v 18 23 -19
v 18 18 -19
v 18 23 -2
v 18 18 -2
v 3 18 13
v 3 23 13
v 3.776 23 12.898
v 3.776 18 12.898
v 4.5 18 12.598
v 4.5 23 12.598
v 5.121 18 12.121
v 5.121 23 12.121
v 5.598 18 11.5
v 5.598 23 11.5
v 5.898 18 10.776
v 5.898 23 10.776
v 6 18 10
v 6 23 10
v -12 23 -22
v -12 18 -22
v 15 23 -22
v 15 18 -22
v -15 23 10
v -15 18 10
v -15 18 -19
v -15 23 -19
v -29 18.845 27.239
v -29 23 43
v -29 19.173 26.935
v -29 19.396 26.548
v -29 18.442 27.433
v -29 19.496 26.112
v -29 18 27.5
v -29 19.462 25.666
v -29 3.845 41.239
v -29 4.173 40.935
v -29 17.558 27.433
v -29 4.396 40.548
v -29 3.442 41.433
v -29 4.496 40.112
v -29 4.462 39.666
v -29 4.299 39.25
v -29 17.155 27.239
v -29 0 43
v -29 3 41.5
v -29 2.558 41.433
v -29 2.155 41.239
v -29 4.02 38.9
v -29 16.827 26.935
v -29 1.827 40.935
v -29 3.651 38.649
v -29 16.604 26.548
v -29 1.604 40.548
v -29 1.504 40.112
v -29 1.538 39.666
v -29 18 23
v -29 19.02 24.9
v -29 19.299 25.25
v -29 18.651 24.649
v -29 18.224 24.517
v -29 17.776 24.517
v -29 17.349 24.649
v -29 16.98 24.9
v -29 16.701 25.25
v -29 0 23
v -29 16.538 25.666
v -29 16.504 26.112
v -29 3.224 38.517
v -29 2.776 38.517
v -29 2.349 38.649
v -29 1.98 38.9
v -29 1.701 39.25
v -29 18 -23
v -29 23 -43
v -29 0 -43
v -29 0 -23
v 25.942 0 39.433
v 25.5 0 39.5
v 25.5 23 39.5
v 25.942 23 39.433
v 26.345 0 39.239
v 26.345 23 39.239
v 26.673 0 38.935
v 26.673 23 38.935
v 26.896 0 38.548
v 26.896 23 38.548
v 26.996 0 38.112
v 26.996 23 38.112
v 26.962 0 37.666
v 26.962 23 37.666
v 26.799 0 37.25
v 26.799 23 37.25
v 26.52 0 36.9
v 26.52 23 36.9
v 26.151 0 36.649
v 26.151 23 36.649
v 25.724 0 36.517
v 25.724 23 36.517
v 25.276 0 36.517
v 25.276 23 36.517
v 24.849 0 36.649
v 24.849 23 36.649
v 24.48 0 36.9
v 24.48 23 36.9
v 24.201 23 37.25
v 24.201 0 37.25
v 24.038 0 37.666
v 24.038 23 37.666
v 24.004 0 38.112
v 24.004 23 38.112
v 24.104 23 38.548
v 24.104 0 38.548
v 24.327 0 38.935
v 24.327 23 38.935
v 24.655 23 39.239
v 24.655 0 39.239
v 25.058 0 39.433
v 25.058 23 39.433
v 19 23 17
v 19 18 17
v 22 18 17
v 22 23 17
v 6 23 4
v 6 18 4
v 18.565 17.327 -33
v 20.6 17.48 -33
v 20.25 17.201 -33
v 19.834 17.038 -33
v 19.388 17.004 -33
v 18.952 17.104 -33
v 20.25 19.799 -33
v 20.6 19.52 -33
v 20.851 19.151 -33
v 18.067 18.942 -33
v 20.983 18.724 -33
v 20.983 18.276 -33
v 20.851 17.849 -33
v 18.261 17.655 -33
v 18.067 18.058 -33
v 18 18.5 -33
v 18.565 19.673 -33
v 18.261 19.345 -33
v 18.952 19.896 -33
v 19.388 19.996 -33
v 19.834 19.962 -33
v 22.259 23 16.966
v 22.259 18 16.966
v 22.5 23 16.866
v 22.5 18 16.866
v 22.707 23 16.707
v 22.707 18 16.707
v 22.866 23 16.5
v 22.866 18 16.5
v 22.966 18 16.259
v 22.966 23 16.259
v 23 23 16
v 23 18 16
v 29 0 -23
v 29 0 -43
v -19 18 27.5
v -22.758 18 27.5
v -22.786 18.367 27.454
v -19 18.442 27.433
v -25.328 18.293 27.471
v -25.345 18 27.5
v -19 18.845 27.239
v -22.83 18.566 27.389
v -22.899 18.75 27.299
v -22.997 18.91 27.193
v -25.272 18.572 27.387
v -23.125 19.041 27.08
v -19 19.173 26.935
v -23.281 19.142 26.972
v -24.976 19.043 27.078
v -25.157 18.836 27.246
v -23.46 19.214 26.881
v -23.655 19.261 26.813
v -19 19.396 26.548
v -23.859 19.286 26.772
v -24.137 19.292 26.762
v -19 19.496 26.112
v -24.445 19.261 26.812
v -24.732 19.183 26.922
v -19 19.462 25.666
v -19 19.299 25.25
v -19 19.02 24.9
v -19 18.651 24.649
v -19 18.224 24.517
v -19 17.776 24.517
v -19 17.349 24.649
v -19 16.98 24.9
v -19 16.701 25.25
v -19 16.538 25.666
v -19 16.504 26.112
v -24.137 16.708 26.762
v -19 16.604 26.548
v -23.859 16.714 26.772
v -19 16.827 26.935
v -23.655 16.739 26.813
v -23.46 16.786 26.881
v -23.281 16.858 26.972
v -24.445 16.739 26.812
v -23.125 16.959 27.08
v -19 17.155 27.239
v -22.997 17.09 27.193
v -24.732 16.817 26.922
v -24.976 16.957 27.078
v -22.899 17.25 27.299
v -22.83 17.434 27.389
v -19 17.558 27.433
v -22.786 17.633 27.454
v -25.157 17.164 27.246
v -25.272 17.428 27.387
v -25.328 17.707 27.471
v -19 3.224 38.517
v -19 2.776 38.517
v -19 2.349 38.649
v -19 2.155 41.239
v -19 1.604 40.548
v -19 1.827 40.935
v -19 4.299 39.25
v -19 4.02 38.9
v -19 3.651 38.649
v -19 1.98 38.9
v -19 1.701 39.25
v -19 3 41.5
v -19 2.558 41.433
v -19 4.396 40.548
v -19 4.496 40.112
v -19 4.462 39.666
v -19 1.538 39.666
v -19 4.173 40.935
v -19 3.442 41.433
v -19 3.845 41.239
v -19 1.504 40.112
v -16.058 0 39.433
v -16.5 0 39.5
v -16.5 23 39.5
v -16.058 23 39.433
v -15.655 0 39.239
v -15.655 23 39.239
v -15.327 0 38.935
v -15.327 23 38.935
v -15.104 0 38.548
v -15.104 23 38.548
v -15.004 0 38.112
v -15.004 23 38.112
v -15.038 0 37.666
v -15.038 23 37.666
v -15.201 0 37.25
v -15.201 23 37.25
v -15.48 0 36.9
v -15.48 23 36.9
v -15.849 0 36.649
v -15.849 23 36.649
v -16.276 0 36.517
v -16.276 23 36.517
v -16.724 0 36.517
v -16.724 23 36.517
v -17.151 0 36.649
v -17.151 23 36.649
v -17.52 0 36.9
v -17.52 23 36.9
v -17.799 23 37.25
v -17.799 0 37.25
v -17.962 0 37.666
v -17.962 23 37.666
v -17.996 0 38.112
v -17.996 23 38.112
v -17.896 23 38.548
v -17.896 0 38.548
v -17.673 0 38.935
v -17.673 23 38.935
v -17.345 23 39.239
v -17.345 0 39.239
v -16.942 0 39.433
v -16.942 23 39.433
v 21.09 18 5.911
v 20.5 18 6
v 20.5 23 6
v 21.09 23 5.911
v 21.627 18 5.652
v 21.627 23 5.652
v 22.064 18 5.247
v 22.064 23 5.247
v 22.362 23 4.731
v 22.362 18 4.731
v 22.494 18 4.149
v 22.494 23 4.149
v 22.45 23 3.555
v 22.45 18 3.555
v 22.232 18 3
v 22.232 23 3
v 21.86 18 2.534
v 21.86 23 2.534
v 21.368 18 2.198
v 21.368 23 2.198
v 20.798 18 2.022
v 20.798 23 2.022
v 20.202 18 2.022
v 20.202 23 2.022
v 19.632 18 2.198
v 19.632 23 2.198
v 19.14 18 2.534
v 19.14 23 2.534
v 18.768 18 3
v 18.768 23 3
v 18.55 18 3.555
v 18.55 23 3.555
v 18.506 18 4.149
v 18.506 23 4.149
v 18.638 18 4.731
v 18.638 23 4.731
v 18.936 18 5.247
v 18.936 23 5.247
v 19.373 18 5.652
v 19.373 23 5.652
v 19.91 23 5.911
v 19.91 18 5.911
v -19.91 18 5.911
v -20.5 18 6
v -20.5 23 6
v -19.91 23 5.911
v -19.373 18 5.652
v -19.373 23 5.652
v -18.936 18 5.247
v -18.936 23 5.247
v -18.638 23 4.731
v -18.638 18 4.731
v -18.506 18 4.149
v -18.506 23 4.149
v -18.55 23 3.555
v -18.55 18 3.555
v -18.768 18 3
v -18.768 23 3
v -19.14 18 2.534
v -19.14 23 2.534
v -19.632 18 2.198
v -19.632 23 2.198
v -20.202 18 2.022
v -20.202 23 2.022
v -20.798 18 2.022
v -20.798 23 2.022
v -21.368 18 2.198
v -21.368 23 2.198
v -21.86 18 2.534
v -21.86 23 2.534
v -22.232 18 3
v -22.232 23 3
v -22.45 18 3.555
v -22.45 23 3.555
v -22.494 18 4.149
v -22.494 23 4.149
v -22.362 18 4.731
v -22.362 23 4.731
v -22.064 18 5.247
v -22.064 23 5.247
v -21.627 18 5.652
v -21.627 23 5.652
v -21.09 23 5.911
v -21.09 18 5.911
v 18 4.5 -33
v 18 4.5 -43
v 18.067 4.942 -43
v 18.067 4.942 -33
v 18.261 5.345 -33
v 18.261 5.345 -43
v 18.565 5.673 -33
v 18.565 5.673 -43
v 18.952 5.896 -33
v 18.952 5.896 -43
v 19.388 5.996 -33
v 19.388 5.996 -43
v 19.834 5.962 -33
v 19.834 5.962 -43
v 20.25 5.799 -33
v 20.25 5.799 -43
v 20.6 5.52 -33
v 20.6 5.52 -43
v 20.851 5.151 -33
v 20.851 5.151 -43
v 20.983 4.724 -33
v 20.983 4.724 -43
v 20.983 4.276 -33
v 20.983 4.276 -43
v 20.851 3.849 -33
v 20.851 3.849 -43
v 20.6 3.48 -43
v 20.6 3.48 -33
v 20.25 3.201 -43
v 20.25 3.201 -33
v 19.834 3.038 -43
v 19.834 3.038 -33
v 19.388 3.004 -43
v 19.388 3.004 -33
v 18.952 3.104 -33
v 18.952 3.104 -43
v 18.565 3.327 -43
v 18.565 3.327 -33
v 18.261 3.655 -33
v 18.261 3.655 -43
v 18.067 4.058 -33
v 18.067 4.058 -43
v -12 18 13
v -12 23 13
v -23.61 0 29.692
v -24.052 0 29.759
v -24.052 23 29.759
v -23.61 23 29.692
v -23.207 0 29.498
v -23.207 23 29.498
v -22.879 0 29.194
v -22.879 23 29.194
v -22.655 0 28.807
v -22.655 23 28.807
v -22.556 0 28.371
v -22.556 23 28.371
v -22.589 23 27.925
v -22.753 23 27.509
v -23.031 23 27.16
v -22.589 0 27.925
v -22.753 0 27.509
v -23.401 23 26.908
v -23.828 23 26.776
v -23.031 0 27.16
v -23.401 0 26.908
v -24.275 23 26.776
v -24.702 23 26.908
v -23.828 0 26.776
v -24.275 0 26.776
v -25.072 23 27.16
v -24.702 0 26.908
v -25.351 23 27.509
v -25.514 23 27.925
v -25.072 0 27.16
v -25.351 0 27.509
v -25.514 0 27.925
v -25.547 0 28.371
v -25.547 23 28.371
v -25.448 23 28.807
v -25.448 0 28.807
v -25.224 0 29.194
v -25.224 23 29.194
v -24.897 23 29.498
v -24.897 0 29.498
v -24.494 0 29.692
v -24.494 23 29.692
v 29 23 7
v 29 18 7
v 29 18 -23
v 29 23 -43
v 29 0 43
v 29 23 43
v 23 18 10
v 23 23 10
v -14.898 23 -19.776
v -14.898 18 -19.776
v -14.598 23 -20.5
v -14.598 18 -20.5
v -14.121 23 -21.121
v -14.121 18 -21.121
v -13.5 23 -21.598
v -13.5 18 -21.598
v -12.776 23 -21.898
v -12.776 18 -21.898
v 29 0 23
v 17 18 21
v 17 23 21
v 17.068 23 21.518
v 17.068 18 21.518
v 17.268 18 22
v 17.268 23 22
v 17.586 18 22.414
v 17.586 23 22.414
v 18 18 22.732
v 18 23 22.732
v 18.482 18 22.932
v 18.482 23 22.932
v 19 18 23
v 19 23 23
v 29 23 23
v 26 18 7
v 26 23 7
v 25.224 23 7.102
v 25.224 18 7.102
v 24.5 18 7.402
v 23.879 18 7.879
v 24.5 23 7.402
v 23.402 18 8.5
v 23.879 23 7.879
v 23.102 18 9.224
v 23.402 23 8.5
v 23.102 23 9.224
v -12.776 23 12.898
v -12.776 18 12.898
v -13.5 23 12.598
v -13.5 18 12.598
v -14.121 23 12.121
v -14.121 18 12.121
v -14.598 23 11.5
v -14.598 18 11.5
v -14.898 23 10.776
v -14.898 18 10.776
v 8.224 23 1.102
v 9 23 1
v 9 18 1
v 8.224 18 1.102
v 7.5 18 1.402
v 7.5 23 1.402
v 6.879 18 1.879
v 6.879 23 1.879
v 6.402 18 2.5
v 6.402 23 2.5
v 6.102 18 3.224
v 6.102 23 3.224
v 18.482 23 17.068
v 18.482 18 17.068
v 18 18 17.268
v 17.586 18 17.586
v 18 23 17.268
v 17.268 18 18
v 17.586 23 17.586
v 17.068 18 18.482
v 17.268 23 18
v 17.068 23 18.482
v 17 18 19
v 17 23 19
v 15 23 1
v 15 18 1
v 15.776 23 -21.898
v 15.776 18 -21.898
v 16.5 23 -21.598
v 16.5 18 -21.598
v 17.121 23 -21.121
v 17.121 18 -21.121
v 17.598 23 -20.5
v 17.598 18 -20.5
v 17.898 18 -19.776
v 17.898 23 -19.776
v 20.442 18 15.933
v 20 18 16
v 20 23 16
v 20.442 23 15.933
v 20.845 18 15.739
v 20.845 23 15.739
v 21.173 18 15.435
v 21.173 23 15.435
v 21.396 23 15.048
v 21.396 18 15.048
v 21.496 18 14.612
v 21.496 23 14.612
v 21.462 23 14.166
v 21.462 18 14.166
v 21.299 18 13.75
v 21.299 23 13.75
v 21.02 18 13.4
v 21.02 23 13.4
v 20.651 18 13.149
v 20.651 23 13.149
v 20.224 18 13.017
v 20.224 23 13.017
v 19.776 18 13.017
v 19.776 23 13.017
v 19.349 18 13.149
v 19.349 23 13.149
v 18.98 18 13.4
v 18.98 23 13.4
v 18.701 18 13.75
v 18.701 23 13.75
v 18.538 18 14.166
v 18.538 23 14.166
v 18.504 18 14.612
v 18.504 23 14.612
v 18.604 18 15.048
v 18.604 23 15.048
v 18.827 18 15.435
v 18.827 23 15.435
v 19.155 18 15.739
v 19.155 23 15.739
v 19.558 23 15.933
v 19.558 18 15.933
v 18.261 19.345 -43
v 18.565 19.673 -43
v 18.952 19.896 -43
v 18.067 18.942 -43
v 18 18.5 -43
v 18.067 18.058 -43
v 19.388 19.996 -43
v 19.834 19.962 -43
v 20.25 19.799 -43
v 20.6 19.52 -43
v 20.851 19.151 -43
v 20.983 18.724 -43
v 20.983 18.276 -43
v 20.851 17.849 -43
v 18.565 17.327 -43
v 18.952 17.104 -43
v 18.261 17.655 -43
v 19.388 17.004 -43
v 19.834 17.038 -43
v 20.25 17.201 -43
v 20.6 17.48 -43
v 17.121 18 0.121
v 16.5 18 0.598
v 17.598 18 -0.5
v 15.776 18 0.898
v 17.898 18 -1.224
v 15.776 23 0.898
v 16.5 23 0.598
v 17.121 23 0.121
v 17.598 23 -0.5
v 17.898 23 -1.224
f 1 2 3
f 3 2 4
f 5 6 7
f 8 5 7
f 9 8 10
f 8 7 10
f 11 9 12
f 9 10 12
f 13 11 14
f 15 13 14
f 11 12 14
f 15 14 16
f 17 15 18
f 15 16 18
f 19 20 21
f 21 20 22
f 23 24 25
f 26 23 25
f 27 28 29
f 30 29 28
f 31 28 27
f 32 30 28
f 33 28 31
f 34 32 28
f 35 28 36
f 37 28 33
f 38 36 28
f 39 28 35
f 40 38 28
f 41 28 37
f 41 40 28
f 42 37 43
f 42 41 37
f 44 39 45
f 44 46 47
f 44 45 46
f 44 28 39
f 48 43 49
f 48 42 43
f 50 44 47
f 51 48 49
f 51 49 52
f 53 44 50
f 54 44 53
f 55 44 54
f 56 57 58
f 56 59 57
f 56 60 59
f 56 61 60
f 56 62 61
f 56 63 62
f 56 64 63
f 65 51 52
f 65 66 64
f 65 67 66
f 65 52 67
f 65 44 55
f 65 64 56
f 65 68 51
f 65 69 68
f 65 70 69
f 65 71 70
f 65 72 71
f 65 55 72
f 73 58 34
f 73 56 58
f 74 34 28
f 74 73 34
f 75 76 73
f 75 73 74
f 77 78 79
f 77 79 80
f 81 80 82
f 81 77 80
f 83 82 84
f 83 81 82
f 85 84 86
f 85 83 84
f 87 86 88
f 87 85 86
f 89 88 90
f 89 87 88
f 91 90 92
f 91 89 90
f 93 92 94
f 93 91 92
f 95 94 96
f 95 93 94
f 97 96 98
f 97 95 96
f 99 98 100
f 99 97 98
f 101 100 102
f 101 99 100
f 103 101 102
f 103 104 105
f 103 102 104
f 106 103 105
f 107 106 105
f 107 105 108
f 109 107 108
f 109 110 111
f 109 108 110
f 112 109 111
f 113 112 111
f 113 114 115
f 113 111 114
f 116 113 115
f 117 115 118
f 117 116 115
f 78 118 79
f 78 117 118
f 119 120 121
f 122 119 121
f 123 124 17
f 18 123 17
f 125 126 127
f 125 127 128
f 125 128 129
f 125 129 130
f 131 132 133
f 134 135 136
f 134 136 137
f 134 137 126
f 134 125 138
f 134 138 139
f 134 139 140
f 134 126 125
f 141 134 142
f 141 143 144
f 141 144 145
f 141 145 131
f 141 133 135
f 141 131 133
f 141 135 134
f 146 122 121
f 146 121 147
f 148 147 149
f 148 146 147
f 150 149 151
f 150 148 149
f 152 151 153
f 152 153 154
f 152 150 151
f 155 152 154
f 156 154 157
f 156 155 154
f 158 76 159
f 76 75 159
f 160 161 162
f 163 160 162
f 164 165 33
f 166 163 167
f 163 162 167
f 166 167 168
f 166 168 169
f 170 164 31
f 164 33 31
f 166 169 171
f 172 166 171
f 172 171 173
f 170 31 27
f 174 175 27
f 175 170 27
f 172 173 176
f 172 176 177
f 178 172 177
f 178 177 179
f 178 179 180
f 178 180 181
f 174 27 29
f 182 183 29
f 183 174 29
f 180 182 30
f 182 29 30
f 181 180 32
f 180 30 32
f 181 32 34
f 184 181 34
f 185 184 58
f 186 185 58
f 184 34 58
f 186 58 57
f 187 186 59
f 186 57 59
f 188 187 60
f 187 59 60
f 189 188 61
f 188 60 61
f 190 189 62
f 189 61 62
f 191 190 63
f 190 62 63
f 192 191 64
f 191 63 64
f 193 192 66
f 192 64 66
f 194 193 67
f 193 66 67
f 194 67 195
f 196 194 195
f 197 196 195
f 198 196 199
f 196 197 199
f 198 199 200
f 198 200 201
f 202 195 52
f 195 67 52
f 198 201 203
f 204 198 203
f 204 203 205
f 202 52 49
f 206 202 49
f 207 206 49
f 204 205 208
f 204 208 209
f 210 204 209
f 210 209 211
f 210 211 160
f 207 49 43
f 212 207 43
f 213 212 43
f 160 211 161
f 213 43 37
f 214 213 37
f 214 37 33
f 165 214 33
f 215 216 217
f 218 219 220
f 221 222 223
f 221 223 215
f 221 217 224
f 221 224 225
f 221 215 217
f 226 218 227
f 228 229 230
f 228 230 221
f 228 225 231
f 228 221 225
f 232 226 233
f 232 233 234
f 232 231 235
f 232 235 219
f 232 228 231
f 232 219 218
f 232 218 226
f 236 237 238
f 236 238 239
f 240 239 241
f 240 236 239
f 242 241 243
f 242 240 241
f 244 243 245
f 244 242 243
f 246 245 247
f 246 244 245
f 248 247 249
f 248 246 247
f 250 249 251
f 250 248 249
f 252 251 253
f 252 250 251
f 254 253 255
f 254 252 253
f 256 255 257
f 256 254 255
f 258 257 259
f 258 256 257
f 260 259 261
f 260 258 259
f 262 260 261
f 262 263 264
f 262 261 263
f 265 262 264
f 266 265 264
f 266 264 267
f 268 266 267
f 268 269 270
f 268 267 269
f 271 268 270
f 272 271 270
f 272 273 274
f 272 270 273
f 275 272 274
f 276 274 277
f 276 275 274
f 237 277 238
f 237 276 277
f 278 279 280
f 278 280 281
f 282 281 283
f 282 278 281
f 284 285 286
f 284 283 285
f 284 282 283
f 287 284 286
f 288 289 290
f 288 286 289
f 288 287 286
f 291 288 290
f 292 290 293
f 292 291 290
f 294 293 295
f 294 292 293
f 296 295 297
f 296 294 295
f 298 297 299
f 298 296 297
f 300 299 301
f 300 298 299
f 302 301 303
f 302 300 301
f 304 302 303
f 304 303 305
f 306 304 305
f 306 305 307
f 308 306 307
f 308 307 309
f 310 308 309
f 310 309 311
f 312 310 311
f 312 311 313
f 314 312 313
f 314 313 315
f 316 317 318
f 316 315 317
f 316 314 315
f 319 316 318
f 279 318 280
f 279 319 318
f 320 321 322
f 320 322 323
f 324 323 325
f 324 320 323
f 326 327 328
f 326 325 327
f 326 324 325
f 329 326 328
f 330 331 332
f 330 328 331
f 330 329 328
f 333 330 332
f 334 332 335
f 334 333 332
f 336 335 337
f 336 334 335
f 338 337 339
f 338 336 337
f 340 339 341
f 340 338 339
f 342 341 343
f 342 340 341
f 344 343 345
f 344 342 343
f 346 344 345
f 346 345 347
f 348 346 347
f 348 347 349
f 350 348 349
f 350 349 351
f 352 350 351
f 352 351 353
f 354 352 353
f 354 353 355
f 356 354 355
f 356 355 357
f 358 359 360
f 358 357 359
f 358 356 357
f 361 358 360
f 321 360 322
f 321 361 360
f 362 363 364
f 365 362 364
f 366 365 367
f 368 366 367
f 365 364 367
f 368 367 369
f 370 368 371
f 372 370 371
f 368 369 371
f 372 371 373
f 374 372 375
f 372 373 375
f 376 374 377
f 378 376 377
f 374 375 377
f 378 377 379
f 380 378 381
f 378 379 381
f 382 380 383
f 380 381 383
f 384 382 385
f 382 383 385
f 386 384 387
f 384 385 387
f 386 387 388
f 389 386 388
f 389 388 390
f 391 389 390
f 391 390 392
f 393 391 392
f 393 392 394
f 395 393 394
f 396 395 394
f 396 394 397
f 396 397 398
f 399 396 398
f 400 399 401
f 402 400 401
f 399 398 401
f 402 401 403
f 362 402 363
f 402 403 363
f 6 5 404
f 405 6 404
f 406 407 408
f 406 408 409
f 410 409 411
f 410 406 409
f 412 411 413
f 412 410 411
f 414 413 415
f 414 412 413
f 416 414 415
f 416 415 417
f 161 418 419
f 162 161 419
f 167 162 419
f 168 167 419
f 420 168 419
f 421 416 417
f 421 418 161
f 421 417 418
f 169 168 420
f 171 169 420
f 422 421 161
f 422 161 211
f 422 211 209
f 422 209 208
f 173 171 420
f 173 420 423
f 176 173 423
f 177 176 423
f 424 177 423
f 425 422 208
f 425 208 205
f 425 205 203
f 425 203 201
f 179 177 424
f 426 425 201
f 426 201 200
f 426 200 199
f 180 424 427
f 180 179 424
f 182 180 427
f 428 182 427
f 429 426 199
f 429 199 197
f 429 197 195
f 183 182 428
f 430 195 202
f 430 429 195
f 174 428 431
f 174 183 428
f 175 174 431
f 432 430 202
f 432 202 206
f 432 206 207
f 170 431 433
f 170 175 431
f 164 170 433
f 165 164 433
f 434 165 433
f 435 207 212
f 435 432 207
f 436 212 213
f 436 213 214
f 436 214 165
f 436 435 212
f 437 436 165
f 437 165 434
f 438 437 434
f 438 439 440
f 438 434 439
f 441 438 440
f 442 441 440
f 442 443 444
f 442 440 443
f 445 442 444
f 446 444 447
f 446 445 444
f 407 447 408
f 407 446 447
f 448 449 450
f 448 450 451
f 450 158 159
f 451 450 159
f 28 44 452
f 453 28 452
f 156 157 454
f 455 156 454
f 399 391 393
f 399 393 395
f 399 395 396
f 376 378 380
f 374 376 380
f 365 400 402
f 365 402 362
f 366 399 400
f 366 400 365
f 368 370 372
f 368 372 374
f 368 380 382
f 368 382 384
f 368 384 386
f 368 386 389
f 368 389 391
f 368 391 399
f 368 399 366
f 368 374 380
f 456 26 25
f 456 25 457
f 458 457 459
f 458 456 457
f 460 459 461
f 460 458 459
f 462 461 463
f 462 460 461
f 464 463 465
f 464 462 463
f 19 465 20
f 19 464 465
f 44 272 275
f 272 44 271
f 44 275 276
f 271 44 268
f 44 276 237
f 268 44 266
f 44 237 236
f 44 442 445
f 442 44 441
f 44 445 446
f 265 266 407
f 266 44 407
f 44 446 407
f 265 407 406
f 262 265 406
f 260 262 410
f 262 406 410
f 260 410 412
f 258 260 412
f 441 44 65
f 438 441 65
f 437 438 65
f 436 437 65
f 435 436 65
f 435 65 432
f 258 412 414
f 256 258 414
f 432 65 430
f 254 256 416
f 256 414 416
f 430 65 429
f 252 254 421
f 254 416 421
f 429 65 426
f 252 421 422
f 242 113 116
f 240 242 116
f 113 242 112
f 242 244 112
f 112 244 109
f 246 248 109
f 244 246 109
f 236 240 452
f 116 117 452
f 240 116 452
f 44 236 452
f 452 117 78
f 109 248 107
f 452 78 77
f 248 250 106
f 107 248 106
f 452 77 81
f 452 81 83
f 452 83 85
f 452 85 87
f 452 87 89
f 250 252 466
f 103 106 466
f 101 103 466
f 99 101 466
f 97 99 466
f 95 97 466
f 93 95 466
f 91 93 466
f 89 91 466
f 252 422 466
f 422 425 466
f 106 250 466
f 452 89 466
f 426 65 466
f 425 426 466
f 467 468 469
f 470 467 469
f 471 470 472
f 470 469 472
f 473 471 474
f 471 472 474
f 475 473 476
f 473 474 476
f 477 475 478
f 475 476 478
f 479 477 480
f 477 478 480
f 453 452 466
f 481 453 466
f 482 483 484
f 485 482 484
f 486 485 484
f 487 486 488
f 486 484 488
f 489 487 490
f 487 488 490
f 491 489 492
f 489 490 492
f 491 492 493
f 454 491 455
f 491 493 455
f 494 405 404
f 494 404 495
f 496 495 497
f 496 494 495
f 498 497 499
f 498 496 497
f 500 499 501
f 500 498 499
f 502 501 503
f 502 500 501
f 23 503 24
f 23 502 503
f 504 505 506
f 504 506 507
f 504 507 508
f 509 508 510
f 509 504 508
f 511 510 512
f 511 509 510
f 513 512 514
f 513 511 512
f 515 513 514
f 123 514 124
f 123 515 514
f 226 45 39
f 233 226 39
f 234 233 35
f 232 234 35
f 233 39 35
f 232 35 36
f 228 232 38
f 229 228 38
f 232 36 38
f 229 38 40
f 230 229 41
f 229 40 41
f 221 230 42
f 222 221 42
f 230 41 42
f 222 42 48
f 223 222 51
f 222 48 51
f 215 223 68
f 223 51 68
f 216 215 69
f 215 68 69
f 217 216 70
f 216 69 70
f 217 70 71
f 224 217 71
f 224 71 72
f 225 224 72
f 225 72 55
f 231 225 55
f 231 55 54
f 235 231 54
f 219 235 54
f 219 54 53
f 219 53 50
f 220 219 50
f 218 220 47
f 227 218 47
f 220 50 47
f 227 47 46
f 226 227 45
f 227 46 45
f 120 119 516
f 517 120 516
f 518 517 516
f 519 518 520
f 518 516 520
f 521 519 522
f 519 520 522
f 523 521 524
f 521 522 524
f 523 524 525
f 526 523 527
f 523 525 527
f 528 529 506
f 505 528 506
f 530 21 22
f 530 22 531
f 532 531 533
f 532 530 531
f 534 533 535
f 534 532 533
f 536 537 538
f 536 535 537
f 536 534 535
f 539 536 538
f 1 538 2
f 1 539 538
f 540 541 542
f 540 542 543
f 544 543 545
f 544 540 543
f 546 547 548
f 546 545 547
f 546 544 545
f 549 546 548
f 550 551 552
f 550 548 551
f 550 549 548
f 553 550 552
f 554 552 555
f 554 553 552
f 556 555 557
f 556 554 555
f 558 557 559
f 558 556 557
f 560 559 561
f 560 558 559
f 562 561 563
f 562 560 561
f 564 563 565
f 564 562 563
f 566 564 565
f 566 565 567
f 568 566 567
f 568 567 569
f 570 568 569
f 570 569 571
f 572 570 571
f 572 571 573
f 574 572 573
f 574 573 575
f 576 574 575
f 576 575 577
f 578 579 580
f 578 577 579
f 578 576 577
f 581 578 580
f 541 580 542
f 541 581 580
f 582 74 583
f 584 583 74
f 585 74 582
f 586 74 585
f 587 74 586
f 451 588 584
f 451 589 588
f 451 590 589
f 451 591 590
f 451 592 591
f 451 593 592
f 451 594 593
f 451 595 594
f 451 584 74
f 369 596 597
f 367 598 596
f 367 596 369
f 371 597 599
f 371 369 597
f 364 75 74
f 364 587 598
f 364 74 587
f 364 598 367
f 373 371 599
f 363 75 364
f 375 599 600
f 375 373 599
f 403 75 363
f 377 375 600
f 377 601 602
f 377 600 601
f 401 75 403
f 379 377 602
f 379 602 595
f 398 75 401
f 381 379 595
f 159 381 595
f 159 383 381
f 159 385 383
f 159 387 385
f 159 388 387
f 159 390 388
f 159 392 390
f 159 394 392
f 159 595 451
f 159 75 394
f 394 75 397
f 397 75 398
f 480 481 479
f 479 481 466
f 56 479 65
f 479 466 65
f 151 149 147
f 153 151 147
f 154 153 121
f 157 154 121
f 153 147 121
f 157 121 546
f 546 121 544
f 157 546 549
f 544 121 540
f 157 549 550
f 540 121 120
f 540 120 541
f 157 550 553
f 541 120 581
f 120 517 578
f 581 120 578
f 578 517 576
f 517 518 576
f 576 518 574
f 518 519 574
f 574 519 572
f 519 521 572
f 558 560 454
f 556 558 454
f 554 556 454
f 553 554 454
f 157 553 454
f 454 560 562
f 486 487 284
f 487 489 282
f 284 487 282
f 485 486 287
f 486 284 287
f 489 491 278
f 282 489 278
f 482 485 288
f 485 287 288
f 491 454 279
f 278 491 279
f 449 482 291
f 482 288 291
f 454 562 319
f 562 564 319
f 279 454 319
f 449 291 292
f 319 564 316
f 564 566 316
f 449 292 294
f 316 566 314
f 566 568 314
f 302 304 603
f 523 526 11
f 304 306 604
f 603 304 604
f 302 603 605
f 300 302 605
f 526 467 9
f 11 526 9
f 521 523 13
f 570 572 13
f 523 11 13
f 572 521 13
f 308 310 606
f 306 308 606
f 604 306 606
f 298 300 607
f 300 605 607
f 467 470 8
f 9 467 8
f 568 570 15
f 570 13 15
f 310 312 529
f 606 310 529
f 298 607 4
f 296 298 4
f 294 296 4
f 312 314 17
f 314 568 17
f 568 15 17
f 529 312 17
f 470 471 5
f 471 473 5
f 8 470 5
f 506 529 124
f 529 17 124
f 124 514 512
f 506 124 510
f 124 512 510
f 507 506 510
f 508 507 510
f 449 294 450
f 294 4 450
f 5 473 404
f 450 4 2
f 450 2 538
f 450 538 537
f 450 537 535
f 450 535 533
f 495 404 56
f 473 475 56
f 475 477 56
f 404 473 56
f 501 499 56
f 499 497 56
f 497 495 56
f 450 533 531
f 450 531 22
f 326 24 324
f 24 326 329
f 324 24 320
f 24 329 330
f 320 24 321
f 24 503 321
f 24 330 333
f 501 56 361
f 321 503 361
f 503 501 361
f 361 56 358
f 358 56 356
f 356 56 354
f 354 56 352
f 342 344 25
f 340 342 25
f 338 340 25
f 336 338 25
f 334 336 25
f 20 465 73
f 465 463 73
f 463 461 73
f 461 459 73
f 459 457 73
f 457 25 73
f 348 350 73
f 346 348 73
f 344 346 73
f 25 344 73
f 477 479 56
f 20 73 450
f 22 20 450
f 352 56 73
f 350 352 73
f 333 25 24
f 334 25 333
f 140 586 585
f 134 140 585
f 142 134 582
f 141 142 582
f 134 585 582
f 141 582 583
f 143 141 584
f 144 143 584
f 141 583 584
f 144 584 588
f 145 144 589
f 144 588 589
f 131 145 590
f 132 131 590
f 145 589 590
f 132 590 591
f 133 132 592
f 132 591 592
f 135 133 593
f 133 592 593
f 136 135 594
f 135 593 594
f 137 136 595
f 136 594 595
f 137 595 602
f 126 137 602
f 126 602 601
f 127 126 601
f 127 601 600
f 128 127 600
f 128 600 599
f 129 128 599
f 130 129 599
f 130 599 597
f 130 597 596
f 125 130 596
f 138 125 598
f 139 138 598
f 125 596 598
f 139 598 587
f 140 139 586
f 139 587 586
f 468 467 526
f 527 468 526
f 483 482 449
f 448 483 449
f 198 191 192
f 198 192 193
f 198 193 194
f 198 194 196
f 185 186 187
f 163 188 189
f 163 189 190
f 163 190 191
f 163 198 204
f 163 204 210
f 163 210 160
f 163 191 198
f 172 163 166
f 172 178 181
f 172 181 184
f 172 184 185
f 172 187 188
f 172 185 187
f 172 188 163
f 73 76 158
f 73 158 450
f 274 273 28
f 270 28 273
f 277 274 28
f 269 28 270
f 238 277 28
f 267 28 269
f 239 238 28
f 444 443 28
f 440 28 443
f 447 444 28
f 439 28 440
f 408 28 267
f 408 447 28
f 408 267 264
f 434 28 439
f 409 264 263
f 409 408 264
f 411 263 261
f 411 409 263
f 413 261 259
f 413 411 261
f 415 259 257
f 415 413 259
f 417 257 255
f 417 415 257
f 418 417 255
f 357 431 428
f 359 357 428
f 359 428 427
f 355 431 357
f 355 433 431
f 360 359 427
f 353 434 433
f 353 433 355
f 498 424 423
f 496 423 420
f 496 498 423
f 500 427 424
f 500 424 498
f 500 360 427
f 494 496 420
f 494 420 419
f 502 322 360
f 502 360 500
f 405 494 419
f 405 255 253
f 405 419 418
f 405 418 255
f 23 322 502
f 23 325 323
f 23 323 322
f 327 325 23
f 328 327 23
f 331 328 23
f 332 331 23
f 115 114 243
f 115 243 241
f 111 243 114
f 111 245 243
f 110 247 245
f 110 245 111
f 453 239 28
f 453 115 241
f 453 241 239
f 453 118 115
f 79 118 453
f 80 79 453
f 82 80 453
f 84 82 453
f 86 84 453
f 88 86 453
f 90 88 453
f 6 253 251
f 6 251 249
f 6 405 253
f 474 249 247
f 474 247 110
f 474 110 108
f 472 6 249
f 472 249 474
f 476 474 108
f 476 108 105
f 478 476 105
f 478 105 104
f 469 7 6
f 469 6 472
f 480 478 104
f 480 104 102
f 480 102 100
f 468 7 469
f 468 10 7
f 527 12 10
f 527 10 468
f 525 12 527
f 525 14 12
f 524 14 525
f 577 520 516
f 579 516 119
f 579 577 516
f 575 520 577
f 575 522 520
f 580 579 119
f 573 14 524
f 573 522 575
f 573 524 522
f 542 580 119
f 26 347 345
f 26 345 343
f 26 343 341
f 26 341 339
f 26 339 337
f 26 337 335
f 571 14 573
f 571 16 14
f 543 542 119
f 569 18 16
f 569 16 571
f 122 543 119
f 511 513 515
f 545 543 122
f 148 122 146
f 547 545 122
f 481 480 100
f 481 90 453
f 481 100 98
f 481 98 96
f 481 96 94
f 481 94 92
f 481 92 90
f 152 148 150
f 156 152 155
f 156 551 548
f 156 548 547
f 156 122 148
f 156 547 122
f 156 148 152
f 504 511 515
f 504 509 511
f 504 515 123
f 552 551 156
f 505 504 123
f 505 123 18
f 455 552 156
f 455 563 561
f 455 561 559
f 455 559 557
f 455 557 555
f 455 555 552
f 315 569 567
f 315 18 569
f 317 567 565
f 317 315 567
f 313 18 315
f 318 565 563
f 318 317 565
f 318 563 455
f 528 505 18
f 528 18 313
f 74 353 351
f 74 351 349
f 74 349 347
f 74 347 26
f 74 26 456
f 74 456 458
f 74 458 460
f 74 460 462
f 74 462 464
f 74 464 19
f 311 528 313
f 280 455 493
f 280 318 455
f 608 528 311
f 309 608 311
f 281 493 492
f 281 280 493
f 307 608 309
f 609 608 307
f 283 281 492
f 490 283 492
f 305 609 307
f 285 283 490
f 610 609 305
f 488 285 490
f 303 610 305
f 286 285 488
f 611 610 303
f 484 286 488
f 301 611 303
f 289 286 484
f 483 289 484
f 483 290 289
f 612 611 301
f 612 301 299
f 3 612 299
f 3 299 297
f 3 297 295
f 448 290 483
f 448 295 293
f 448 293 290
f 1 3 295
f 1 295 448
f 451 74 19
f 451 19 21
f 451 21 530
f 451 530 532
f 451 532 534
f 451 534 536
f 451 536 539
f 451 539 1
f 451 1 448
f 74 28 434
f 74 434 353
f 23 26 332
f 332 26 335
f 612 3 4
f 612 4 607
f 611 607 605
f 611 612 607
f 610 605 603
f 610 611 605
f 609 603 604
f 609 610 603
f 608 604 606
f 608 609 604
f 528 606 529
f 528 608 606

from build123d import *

# Parameters (mm, degrees)
SKETCH1_W               = 58
SKETCH1_H               = 86
BOSS_EXTRUDE1_DEPTH     = 23
CUT_EXTRUDE1_DEPTH      = 23
CUT_EXTRUDE2_DEPTH      = 23
FILLET1_R               = 3
FILLET2_R               = 2
FILLET3_R               = 2
FILLET4_R               = 1
FILLET5_R               = 3
FILLET6_R               = 3
FILLET7_R               = 3
FILLET8_R               = 3
FILLET9_R               = 3
FILLET10_R              = 3
CUT_EXTRUDE3_DEPTH      = 57.73623181
CUT_EXTRUDE3_DEPTH_BACK = 57.73623181
SKETCH4_W               = 46
SKETCH4_H               = 18
CUT_EXTRUDE4_DEPTH      = 57.73623181
CUT_EXTRUDE4_DEPTH_BACK = 57.73623181
SKETCH5_R               = 2
SKETCH5_R_2             = 1.5
SKETCH6_R               = 1.5
CUT_EXTRUDE11_DEPTH     = 10
SKETCH7_R               = 1.5
CUT_EXTRUDE12_DEPTH     = 10


with BuildPart() as part:
    # Sketch1 → Boss-Extrude1 (new body)
    with BuildSketch(Plane(origin=(0, 0, 0), x_dir=(1, 0, 0), z_dir=(0, 1, 0))):
        Rectangle(SKETCH1_W, SKETCH1_H)
    extrude(amount=BOSS_EXTRUDE1_DEPTH)

    # Sketch2 → Cut-Extrude1 (cut)
    with BuildSketch(Plane(origin=(0, 0, 0), x_dir=(1, 0, 0), z_dir=(0, 1, 0))):
        Polygon((29, -23), (17, -23), (17, -17), (23, -17), (23, -7), (29, -7), align=None)
    extrude(amount=CUT_EXTRUDE1_DEPTH, mode=Mode.SUBTRACT)

    # Sketch3 → Cut-Extrude2 (cut)
    with BuildSketch(Plane(origin=(0, 0, 0), x_dir=(1, 0, 0), z_dir=(0, 1, 0))):
        Polygon((-15, -13), (-15, 22), (18, 22), (18, -1), (6, -1), (6, -13), align=None)
    extrude(amount=CUT_EXTRUDE2_DEPTH, mode=Mode.SUBTRACT)

    # Fillet1
    fillet1_edges = [part.edges().sort_by_distance(p)[0] for p in [
        (23, 11.5, 7),
    ]]
    fillet(fillet1_edges, radius=FILLET1_R)

    # Fillet2
    fillet2_edges = [part.edges().sort_by_distance(p)[0] for p in [
        (17, 11.5, 17),
    ]]
    fillet(fillet2_edges, radius=FILLET2_R)

    # Fillet3
    fillet3_edges = [part.edges().sort_by_distance(p)[0] for p in [
        (17, 11.5, 23),
    ]]
    fillet(fillet3_edges, radius=FILLET3_R)

    # Fillet4
    fillet4_edges = [part.edges().sort_by_distance(p)[0] for p in [
        (23, 11.5, 17),
    ]]
    fillet(fillet4_edges, radius=FILLET4_R)

    # Fillet5
    fillet5_edges = [part.edges().sort_by_distance(p)[0] for p in [
        (-15, 11.5, 13),
    ]]
    fillet(fillet5_edges, radius=FILLET5_R)

    # Fillet6
    fillet6_edges = [part.edges().sort_by_distance(p)[0] for p in [
        (6, 11.5, 13),
    ]]
    fillet(fillet6_edges, radius=FILLET6_R)

    # Fillet7
    fillet7_edges = [part.edges().sort_by_distance(p)[0] for p in [
        (-15, 11.5, -22),
    ]]
    fillet(fillet7_edges, radius=FILLET7_R)

    # Fillet8
    fillet8_edges = [part.edges().sort_by_distance(p)[0] for p in [
        (18, 11.5, -22),
    ]]
    fillet(fillet8_edges, radius=FILLET8_R)

    # Fillet9
    fillet9_edges = [part.edges().sort_by_distance(p)[0] for p in [
        (18, 11.5, 1),
    ]]
    fillet(fillet9_edges, radius=FILLET9_R)

    # Fillet10
    fillet10_edges = [part.edges().sort_by_distance(p)[0] for p in [
        (6, 11.5, 1),
    ]]
    fillet(fillet10_edges, radius=FILLET10_R)

    # Sketch4 → Cut-Extrude3 (cut, two sides: drawn at the far end of the back side and taken through both)
    with BuildSketch(Plane(origin=(0, 0, 0), x_dir=(0, 0, -1), z_dir=(1, 0, 0)).offset(-CUT_EXTRUDE3_DEPTH_BACK)):
        with Locations((0, 9)):
            Rectangle(SKETCH4_W, SKETCH4_H)
    extrude(amount=CUT_EXTRUDE3_DEPTH + CUT_EXTRUDE3_DEPTH_BACK, mode=Mode.SUBTRACT)

    # Sketch5 → Cut-Extrude4 (cut, two sides: drawn at the far end of the back side and taken through both)
    with BuildSketch(Plane(origin=(0, 0, 0), x_dir=(1, 0, 0), z_dir=(0, 1, 0)).offset(-CUT_EXTRUDE4_DEPTH_BACK)):
        with Locations(Location((20.5, -4, 0), (0, 0, 270))):
            Circle(SKETCH5_R)
        with Locations(Location((-20.5, -4, 0), (0, 0, 270))):
            Circle(SKETCH5_R)
        with Locations(Location((20, -14.5, 0), (0, 0, 270))):
            Circle(SKETCH5_R_2)
        with Locations(Location((-16.5, -38, 0), (0, 0, 270))):
            Circle(SKETCH5_R_2)
        with Locations(Location((25.5, -38, 0), (0, 0, 270))):
            Circle(SKETCH5_R_2)
        with Locations(Location((-24.051636808, -28.259079953, 0), (0, 0, 270))):
            Circle(SKETCH5_R_2)
    extrude(amount=CUT_EXTRUDE4_DEPTH + CUT_EXTRUDE4_DEPTH_BACK, mode=Mode.SUBTRACT)

    # Sketch6 → Cut-Extrude11 (cut)
    with BuildSketch(Plane.ZY.offset(29)):
        with Locations((40, 3)):
            Circle(SKETCH6_R)
        with Locations((26, 18)):
            Circle(SKETCH6_R)
    extrude(amount=-CUT_EXTRUDE11_DEPTH, mode=Mode.SUBTRACT)

    # Sketch7 → Cut-Extrude12 (cut)
    with BuildSketch(Plane(origin=(0, 0, -43), x_dir=(-1, 0, 0), z_dir=(0, 0, -1))):
        with Locations((-19.5, 4.5)):
            Circle(SKETCH7_R)
        with Locations((-19.5, 18.5)):
            Circle(SKETCH7_R)
    extrude(amount=-CUT_EXTRUDE12_DEPTH, mode=Mode.SUBTRACT)


solid = part.part
